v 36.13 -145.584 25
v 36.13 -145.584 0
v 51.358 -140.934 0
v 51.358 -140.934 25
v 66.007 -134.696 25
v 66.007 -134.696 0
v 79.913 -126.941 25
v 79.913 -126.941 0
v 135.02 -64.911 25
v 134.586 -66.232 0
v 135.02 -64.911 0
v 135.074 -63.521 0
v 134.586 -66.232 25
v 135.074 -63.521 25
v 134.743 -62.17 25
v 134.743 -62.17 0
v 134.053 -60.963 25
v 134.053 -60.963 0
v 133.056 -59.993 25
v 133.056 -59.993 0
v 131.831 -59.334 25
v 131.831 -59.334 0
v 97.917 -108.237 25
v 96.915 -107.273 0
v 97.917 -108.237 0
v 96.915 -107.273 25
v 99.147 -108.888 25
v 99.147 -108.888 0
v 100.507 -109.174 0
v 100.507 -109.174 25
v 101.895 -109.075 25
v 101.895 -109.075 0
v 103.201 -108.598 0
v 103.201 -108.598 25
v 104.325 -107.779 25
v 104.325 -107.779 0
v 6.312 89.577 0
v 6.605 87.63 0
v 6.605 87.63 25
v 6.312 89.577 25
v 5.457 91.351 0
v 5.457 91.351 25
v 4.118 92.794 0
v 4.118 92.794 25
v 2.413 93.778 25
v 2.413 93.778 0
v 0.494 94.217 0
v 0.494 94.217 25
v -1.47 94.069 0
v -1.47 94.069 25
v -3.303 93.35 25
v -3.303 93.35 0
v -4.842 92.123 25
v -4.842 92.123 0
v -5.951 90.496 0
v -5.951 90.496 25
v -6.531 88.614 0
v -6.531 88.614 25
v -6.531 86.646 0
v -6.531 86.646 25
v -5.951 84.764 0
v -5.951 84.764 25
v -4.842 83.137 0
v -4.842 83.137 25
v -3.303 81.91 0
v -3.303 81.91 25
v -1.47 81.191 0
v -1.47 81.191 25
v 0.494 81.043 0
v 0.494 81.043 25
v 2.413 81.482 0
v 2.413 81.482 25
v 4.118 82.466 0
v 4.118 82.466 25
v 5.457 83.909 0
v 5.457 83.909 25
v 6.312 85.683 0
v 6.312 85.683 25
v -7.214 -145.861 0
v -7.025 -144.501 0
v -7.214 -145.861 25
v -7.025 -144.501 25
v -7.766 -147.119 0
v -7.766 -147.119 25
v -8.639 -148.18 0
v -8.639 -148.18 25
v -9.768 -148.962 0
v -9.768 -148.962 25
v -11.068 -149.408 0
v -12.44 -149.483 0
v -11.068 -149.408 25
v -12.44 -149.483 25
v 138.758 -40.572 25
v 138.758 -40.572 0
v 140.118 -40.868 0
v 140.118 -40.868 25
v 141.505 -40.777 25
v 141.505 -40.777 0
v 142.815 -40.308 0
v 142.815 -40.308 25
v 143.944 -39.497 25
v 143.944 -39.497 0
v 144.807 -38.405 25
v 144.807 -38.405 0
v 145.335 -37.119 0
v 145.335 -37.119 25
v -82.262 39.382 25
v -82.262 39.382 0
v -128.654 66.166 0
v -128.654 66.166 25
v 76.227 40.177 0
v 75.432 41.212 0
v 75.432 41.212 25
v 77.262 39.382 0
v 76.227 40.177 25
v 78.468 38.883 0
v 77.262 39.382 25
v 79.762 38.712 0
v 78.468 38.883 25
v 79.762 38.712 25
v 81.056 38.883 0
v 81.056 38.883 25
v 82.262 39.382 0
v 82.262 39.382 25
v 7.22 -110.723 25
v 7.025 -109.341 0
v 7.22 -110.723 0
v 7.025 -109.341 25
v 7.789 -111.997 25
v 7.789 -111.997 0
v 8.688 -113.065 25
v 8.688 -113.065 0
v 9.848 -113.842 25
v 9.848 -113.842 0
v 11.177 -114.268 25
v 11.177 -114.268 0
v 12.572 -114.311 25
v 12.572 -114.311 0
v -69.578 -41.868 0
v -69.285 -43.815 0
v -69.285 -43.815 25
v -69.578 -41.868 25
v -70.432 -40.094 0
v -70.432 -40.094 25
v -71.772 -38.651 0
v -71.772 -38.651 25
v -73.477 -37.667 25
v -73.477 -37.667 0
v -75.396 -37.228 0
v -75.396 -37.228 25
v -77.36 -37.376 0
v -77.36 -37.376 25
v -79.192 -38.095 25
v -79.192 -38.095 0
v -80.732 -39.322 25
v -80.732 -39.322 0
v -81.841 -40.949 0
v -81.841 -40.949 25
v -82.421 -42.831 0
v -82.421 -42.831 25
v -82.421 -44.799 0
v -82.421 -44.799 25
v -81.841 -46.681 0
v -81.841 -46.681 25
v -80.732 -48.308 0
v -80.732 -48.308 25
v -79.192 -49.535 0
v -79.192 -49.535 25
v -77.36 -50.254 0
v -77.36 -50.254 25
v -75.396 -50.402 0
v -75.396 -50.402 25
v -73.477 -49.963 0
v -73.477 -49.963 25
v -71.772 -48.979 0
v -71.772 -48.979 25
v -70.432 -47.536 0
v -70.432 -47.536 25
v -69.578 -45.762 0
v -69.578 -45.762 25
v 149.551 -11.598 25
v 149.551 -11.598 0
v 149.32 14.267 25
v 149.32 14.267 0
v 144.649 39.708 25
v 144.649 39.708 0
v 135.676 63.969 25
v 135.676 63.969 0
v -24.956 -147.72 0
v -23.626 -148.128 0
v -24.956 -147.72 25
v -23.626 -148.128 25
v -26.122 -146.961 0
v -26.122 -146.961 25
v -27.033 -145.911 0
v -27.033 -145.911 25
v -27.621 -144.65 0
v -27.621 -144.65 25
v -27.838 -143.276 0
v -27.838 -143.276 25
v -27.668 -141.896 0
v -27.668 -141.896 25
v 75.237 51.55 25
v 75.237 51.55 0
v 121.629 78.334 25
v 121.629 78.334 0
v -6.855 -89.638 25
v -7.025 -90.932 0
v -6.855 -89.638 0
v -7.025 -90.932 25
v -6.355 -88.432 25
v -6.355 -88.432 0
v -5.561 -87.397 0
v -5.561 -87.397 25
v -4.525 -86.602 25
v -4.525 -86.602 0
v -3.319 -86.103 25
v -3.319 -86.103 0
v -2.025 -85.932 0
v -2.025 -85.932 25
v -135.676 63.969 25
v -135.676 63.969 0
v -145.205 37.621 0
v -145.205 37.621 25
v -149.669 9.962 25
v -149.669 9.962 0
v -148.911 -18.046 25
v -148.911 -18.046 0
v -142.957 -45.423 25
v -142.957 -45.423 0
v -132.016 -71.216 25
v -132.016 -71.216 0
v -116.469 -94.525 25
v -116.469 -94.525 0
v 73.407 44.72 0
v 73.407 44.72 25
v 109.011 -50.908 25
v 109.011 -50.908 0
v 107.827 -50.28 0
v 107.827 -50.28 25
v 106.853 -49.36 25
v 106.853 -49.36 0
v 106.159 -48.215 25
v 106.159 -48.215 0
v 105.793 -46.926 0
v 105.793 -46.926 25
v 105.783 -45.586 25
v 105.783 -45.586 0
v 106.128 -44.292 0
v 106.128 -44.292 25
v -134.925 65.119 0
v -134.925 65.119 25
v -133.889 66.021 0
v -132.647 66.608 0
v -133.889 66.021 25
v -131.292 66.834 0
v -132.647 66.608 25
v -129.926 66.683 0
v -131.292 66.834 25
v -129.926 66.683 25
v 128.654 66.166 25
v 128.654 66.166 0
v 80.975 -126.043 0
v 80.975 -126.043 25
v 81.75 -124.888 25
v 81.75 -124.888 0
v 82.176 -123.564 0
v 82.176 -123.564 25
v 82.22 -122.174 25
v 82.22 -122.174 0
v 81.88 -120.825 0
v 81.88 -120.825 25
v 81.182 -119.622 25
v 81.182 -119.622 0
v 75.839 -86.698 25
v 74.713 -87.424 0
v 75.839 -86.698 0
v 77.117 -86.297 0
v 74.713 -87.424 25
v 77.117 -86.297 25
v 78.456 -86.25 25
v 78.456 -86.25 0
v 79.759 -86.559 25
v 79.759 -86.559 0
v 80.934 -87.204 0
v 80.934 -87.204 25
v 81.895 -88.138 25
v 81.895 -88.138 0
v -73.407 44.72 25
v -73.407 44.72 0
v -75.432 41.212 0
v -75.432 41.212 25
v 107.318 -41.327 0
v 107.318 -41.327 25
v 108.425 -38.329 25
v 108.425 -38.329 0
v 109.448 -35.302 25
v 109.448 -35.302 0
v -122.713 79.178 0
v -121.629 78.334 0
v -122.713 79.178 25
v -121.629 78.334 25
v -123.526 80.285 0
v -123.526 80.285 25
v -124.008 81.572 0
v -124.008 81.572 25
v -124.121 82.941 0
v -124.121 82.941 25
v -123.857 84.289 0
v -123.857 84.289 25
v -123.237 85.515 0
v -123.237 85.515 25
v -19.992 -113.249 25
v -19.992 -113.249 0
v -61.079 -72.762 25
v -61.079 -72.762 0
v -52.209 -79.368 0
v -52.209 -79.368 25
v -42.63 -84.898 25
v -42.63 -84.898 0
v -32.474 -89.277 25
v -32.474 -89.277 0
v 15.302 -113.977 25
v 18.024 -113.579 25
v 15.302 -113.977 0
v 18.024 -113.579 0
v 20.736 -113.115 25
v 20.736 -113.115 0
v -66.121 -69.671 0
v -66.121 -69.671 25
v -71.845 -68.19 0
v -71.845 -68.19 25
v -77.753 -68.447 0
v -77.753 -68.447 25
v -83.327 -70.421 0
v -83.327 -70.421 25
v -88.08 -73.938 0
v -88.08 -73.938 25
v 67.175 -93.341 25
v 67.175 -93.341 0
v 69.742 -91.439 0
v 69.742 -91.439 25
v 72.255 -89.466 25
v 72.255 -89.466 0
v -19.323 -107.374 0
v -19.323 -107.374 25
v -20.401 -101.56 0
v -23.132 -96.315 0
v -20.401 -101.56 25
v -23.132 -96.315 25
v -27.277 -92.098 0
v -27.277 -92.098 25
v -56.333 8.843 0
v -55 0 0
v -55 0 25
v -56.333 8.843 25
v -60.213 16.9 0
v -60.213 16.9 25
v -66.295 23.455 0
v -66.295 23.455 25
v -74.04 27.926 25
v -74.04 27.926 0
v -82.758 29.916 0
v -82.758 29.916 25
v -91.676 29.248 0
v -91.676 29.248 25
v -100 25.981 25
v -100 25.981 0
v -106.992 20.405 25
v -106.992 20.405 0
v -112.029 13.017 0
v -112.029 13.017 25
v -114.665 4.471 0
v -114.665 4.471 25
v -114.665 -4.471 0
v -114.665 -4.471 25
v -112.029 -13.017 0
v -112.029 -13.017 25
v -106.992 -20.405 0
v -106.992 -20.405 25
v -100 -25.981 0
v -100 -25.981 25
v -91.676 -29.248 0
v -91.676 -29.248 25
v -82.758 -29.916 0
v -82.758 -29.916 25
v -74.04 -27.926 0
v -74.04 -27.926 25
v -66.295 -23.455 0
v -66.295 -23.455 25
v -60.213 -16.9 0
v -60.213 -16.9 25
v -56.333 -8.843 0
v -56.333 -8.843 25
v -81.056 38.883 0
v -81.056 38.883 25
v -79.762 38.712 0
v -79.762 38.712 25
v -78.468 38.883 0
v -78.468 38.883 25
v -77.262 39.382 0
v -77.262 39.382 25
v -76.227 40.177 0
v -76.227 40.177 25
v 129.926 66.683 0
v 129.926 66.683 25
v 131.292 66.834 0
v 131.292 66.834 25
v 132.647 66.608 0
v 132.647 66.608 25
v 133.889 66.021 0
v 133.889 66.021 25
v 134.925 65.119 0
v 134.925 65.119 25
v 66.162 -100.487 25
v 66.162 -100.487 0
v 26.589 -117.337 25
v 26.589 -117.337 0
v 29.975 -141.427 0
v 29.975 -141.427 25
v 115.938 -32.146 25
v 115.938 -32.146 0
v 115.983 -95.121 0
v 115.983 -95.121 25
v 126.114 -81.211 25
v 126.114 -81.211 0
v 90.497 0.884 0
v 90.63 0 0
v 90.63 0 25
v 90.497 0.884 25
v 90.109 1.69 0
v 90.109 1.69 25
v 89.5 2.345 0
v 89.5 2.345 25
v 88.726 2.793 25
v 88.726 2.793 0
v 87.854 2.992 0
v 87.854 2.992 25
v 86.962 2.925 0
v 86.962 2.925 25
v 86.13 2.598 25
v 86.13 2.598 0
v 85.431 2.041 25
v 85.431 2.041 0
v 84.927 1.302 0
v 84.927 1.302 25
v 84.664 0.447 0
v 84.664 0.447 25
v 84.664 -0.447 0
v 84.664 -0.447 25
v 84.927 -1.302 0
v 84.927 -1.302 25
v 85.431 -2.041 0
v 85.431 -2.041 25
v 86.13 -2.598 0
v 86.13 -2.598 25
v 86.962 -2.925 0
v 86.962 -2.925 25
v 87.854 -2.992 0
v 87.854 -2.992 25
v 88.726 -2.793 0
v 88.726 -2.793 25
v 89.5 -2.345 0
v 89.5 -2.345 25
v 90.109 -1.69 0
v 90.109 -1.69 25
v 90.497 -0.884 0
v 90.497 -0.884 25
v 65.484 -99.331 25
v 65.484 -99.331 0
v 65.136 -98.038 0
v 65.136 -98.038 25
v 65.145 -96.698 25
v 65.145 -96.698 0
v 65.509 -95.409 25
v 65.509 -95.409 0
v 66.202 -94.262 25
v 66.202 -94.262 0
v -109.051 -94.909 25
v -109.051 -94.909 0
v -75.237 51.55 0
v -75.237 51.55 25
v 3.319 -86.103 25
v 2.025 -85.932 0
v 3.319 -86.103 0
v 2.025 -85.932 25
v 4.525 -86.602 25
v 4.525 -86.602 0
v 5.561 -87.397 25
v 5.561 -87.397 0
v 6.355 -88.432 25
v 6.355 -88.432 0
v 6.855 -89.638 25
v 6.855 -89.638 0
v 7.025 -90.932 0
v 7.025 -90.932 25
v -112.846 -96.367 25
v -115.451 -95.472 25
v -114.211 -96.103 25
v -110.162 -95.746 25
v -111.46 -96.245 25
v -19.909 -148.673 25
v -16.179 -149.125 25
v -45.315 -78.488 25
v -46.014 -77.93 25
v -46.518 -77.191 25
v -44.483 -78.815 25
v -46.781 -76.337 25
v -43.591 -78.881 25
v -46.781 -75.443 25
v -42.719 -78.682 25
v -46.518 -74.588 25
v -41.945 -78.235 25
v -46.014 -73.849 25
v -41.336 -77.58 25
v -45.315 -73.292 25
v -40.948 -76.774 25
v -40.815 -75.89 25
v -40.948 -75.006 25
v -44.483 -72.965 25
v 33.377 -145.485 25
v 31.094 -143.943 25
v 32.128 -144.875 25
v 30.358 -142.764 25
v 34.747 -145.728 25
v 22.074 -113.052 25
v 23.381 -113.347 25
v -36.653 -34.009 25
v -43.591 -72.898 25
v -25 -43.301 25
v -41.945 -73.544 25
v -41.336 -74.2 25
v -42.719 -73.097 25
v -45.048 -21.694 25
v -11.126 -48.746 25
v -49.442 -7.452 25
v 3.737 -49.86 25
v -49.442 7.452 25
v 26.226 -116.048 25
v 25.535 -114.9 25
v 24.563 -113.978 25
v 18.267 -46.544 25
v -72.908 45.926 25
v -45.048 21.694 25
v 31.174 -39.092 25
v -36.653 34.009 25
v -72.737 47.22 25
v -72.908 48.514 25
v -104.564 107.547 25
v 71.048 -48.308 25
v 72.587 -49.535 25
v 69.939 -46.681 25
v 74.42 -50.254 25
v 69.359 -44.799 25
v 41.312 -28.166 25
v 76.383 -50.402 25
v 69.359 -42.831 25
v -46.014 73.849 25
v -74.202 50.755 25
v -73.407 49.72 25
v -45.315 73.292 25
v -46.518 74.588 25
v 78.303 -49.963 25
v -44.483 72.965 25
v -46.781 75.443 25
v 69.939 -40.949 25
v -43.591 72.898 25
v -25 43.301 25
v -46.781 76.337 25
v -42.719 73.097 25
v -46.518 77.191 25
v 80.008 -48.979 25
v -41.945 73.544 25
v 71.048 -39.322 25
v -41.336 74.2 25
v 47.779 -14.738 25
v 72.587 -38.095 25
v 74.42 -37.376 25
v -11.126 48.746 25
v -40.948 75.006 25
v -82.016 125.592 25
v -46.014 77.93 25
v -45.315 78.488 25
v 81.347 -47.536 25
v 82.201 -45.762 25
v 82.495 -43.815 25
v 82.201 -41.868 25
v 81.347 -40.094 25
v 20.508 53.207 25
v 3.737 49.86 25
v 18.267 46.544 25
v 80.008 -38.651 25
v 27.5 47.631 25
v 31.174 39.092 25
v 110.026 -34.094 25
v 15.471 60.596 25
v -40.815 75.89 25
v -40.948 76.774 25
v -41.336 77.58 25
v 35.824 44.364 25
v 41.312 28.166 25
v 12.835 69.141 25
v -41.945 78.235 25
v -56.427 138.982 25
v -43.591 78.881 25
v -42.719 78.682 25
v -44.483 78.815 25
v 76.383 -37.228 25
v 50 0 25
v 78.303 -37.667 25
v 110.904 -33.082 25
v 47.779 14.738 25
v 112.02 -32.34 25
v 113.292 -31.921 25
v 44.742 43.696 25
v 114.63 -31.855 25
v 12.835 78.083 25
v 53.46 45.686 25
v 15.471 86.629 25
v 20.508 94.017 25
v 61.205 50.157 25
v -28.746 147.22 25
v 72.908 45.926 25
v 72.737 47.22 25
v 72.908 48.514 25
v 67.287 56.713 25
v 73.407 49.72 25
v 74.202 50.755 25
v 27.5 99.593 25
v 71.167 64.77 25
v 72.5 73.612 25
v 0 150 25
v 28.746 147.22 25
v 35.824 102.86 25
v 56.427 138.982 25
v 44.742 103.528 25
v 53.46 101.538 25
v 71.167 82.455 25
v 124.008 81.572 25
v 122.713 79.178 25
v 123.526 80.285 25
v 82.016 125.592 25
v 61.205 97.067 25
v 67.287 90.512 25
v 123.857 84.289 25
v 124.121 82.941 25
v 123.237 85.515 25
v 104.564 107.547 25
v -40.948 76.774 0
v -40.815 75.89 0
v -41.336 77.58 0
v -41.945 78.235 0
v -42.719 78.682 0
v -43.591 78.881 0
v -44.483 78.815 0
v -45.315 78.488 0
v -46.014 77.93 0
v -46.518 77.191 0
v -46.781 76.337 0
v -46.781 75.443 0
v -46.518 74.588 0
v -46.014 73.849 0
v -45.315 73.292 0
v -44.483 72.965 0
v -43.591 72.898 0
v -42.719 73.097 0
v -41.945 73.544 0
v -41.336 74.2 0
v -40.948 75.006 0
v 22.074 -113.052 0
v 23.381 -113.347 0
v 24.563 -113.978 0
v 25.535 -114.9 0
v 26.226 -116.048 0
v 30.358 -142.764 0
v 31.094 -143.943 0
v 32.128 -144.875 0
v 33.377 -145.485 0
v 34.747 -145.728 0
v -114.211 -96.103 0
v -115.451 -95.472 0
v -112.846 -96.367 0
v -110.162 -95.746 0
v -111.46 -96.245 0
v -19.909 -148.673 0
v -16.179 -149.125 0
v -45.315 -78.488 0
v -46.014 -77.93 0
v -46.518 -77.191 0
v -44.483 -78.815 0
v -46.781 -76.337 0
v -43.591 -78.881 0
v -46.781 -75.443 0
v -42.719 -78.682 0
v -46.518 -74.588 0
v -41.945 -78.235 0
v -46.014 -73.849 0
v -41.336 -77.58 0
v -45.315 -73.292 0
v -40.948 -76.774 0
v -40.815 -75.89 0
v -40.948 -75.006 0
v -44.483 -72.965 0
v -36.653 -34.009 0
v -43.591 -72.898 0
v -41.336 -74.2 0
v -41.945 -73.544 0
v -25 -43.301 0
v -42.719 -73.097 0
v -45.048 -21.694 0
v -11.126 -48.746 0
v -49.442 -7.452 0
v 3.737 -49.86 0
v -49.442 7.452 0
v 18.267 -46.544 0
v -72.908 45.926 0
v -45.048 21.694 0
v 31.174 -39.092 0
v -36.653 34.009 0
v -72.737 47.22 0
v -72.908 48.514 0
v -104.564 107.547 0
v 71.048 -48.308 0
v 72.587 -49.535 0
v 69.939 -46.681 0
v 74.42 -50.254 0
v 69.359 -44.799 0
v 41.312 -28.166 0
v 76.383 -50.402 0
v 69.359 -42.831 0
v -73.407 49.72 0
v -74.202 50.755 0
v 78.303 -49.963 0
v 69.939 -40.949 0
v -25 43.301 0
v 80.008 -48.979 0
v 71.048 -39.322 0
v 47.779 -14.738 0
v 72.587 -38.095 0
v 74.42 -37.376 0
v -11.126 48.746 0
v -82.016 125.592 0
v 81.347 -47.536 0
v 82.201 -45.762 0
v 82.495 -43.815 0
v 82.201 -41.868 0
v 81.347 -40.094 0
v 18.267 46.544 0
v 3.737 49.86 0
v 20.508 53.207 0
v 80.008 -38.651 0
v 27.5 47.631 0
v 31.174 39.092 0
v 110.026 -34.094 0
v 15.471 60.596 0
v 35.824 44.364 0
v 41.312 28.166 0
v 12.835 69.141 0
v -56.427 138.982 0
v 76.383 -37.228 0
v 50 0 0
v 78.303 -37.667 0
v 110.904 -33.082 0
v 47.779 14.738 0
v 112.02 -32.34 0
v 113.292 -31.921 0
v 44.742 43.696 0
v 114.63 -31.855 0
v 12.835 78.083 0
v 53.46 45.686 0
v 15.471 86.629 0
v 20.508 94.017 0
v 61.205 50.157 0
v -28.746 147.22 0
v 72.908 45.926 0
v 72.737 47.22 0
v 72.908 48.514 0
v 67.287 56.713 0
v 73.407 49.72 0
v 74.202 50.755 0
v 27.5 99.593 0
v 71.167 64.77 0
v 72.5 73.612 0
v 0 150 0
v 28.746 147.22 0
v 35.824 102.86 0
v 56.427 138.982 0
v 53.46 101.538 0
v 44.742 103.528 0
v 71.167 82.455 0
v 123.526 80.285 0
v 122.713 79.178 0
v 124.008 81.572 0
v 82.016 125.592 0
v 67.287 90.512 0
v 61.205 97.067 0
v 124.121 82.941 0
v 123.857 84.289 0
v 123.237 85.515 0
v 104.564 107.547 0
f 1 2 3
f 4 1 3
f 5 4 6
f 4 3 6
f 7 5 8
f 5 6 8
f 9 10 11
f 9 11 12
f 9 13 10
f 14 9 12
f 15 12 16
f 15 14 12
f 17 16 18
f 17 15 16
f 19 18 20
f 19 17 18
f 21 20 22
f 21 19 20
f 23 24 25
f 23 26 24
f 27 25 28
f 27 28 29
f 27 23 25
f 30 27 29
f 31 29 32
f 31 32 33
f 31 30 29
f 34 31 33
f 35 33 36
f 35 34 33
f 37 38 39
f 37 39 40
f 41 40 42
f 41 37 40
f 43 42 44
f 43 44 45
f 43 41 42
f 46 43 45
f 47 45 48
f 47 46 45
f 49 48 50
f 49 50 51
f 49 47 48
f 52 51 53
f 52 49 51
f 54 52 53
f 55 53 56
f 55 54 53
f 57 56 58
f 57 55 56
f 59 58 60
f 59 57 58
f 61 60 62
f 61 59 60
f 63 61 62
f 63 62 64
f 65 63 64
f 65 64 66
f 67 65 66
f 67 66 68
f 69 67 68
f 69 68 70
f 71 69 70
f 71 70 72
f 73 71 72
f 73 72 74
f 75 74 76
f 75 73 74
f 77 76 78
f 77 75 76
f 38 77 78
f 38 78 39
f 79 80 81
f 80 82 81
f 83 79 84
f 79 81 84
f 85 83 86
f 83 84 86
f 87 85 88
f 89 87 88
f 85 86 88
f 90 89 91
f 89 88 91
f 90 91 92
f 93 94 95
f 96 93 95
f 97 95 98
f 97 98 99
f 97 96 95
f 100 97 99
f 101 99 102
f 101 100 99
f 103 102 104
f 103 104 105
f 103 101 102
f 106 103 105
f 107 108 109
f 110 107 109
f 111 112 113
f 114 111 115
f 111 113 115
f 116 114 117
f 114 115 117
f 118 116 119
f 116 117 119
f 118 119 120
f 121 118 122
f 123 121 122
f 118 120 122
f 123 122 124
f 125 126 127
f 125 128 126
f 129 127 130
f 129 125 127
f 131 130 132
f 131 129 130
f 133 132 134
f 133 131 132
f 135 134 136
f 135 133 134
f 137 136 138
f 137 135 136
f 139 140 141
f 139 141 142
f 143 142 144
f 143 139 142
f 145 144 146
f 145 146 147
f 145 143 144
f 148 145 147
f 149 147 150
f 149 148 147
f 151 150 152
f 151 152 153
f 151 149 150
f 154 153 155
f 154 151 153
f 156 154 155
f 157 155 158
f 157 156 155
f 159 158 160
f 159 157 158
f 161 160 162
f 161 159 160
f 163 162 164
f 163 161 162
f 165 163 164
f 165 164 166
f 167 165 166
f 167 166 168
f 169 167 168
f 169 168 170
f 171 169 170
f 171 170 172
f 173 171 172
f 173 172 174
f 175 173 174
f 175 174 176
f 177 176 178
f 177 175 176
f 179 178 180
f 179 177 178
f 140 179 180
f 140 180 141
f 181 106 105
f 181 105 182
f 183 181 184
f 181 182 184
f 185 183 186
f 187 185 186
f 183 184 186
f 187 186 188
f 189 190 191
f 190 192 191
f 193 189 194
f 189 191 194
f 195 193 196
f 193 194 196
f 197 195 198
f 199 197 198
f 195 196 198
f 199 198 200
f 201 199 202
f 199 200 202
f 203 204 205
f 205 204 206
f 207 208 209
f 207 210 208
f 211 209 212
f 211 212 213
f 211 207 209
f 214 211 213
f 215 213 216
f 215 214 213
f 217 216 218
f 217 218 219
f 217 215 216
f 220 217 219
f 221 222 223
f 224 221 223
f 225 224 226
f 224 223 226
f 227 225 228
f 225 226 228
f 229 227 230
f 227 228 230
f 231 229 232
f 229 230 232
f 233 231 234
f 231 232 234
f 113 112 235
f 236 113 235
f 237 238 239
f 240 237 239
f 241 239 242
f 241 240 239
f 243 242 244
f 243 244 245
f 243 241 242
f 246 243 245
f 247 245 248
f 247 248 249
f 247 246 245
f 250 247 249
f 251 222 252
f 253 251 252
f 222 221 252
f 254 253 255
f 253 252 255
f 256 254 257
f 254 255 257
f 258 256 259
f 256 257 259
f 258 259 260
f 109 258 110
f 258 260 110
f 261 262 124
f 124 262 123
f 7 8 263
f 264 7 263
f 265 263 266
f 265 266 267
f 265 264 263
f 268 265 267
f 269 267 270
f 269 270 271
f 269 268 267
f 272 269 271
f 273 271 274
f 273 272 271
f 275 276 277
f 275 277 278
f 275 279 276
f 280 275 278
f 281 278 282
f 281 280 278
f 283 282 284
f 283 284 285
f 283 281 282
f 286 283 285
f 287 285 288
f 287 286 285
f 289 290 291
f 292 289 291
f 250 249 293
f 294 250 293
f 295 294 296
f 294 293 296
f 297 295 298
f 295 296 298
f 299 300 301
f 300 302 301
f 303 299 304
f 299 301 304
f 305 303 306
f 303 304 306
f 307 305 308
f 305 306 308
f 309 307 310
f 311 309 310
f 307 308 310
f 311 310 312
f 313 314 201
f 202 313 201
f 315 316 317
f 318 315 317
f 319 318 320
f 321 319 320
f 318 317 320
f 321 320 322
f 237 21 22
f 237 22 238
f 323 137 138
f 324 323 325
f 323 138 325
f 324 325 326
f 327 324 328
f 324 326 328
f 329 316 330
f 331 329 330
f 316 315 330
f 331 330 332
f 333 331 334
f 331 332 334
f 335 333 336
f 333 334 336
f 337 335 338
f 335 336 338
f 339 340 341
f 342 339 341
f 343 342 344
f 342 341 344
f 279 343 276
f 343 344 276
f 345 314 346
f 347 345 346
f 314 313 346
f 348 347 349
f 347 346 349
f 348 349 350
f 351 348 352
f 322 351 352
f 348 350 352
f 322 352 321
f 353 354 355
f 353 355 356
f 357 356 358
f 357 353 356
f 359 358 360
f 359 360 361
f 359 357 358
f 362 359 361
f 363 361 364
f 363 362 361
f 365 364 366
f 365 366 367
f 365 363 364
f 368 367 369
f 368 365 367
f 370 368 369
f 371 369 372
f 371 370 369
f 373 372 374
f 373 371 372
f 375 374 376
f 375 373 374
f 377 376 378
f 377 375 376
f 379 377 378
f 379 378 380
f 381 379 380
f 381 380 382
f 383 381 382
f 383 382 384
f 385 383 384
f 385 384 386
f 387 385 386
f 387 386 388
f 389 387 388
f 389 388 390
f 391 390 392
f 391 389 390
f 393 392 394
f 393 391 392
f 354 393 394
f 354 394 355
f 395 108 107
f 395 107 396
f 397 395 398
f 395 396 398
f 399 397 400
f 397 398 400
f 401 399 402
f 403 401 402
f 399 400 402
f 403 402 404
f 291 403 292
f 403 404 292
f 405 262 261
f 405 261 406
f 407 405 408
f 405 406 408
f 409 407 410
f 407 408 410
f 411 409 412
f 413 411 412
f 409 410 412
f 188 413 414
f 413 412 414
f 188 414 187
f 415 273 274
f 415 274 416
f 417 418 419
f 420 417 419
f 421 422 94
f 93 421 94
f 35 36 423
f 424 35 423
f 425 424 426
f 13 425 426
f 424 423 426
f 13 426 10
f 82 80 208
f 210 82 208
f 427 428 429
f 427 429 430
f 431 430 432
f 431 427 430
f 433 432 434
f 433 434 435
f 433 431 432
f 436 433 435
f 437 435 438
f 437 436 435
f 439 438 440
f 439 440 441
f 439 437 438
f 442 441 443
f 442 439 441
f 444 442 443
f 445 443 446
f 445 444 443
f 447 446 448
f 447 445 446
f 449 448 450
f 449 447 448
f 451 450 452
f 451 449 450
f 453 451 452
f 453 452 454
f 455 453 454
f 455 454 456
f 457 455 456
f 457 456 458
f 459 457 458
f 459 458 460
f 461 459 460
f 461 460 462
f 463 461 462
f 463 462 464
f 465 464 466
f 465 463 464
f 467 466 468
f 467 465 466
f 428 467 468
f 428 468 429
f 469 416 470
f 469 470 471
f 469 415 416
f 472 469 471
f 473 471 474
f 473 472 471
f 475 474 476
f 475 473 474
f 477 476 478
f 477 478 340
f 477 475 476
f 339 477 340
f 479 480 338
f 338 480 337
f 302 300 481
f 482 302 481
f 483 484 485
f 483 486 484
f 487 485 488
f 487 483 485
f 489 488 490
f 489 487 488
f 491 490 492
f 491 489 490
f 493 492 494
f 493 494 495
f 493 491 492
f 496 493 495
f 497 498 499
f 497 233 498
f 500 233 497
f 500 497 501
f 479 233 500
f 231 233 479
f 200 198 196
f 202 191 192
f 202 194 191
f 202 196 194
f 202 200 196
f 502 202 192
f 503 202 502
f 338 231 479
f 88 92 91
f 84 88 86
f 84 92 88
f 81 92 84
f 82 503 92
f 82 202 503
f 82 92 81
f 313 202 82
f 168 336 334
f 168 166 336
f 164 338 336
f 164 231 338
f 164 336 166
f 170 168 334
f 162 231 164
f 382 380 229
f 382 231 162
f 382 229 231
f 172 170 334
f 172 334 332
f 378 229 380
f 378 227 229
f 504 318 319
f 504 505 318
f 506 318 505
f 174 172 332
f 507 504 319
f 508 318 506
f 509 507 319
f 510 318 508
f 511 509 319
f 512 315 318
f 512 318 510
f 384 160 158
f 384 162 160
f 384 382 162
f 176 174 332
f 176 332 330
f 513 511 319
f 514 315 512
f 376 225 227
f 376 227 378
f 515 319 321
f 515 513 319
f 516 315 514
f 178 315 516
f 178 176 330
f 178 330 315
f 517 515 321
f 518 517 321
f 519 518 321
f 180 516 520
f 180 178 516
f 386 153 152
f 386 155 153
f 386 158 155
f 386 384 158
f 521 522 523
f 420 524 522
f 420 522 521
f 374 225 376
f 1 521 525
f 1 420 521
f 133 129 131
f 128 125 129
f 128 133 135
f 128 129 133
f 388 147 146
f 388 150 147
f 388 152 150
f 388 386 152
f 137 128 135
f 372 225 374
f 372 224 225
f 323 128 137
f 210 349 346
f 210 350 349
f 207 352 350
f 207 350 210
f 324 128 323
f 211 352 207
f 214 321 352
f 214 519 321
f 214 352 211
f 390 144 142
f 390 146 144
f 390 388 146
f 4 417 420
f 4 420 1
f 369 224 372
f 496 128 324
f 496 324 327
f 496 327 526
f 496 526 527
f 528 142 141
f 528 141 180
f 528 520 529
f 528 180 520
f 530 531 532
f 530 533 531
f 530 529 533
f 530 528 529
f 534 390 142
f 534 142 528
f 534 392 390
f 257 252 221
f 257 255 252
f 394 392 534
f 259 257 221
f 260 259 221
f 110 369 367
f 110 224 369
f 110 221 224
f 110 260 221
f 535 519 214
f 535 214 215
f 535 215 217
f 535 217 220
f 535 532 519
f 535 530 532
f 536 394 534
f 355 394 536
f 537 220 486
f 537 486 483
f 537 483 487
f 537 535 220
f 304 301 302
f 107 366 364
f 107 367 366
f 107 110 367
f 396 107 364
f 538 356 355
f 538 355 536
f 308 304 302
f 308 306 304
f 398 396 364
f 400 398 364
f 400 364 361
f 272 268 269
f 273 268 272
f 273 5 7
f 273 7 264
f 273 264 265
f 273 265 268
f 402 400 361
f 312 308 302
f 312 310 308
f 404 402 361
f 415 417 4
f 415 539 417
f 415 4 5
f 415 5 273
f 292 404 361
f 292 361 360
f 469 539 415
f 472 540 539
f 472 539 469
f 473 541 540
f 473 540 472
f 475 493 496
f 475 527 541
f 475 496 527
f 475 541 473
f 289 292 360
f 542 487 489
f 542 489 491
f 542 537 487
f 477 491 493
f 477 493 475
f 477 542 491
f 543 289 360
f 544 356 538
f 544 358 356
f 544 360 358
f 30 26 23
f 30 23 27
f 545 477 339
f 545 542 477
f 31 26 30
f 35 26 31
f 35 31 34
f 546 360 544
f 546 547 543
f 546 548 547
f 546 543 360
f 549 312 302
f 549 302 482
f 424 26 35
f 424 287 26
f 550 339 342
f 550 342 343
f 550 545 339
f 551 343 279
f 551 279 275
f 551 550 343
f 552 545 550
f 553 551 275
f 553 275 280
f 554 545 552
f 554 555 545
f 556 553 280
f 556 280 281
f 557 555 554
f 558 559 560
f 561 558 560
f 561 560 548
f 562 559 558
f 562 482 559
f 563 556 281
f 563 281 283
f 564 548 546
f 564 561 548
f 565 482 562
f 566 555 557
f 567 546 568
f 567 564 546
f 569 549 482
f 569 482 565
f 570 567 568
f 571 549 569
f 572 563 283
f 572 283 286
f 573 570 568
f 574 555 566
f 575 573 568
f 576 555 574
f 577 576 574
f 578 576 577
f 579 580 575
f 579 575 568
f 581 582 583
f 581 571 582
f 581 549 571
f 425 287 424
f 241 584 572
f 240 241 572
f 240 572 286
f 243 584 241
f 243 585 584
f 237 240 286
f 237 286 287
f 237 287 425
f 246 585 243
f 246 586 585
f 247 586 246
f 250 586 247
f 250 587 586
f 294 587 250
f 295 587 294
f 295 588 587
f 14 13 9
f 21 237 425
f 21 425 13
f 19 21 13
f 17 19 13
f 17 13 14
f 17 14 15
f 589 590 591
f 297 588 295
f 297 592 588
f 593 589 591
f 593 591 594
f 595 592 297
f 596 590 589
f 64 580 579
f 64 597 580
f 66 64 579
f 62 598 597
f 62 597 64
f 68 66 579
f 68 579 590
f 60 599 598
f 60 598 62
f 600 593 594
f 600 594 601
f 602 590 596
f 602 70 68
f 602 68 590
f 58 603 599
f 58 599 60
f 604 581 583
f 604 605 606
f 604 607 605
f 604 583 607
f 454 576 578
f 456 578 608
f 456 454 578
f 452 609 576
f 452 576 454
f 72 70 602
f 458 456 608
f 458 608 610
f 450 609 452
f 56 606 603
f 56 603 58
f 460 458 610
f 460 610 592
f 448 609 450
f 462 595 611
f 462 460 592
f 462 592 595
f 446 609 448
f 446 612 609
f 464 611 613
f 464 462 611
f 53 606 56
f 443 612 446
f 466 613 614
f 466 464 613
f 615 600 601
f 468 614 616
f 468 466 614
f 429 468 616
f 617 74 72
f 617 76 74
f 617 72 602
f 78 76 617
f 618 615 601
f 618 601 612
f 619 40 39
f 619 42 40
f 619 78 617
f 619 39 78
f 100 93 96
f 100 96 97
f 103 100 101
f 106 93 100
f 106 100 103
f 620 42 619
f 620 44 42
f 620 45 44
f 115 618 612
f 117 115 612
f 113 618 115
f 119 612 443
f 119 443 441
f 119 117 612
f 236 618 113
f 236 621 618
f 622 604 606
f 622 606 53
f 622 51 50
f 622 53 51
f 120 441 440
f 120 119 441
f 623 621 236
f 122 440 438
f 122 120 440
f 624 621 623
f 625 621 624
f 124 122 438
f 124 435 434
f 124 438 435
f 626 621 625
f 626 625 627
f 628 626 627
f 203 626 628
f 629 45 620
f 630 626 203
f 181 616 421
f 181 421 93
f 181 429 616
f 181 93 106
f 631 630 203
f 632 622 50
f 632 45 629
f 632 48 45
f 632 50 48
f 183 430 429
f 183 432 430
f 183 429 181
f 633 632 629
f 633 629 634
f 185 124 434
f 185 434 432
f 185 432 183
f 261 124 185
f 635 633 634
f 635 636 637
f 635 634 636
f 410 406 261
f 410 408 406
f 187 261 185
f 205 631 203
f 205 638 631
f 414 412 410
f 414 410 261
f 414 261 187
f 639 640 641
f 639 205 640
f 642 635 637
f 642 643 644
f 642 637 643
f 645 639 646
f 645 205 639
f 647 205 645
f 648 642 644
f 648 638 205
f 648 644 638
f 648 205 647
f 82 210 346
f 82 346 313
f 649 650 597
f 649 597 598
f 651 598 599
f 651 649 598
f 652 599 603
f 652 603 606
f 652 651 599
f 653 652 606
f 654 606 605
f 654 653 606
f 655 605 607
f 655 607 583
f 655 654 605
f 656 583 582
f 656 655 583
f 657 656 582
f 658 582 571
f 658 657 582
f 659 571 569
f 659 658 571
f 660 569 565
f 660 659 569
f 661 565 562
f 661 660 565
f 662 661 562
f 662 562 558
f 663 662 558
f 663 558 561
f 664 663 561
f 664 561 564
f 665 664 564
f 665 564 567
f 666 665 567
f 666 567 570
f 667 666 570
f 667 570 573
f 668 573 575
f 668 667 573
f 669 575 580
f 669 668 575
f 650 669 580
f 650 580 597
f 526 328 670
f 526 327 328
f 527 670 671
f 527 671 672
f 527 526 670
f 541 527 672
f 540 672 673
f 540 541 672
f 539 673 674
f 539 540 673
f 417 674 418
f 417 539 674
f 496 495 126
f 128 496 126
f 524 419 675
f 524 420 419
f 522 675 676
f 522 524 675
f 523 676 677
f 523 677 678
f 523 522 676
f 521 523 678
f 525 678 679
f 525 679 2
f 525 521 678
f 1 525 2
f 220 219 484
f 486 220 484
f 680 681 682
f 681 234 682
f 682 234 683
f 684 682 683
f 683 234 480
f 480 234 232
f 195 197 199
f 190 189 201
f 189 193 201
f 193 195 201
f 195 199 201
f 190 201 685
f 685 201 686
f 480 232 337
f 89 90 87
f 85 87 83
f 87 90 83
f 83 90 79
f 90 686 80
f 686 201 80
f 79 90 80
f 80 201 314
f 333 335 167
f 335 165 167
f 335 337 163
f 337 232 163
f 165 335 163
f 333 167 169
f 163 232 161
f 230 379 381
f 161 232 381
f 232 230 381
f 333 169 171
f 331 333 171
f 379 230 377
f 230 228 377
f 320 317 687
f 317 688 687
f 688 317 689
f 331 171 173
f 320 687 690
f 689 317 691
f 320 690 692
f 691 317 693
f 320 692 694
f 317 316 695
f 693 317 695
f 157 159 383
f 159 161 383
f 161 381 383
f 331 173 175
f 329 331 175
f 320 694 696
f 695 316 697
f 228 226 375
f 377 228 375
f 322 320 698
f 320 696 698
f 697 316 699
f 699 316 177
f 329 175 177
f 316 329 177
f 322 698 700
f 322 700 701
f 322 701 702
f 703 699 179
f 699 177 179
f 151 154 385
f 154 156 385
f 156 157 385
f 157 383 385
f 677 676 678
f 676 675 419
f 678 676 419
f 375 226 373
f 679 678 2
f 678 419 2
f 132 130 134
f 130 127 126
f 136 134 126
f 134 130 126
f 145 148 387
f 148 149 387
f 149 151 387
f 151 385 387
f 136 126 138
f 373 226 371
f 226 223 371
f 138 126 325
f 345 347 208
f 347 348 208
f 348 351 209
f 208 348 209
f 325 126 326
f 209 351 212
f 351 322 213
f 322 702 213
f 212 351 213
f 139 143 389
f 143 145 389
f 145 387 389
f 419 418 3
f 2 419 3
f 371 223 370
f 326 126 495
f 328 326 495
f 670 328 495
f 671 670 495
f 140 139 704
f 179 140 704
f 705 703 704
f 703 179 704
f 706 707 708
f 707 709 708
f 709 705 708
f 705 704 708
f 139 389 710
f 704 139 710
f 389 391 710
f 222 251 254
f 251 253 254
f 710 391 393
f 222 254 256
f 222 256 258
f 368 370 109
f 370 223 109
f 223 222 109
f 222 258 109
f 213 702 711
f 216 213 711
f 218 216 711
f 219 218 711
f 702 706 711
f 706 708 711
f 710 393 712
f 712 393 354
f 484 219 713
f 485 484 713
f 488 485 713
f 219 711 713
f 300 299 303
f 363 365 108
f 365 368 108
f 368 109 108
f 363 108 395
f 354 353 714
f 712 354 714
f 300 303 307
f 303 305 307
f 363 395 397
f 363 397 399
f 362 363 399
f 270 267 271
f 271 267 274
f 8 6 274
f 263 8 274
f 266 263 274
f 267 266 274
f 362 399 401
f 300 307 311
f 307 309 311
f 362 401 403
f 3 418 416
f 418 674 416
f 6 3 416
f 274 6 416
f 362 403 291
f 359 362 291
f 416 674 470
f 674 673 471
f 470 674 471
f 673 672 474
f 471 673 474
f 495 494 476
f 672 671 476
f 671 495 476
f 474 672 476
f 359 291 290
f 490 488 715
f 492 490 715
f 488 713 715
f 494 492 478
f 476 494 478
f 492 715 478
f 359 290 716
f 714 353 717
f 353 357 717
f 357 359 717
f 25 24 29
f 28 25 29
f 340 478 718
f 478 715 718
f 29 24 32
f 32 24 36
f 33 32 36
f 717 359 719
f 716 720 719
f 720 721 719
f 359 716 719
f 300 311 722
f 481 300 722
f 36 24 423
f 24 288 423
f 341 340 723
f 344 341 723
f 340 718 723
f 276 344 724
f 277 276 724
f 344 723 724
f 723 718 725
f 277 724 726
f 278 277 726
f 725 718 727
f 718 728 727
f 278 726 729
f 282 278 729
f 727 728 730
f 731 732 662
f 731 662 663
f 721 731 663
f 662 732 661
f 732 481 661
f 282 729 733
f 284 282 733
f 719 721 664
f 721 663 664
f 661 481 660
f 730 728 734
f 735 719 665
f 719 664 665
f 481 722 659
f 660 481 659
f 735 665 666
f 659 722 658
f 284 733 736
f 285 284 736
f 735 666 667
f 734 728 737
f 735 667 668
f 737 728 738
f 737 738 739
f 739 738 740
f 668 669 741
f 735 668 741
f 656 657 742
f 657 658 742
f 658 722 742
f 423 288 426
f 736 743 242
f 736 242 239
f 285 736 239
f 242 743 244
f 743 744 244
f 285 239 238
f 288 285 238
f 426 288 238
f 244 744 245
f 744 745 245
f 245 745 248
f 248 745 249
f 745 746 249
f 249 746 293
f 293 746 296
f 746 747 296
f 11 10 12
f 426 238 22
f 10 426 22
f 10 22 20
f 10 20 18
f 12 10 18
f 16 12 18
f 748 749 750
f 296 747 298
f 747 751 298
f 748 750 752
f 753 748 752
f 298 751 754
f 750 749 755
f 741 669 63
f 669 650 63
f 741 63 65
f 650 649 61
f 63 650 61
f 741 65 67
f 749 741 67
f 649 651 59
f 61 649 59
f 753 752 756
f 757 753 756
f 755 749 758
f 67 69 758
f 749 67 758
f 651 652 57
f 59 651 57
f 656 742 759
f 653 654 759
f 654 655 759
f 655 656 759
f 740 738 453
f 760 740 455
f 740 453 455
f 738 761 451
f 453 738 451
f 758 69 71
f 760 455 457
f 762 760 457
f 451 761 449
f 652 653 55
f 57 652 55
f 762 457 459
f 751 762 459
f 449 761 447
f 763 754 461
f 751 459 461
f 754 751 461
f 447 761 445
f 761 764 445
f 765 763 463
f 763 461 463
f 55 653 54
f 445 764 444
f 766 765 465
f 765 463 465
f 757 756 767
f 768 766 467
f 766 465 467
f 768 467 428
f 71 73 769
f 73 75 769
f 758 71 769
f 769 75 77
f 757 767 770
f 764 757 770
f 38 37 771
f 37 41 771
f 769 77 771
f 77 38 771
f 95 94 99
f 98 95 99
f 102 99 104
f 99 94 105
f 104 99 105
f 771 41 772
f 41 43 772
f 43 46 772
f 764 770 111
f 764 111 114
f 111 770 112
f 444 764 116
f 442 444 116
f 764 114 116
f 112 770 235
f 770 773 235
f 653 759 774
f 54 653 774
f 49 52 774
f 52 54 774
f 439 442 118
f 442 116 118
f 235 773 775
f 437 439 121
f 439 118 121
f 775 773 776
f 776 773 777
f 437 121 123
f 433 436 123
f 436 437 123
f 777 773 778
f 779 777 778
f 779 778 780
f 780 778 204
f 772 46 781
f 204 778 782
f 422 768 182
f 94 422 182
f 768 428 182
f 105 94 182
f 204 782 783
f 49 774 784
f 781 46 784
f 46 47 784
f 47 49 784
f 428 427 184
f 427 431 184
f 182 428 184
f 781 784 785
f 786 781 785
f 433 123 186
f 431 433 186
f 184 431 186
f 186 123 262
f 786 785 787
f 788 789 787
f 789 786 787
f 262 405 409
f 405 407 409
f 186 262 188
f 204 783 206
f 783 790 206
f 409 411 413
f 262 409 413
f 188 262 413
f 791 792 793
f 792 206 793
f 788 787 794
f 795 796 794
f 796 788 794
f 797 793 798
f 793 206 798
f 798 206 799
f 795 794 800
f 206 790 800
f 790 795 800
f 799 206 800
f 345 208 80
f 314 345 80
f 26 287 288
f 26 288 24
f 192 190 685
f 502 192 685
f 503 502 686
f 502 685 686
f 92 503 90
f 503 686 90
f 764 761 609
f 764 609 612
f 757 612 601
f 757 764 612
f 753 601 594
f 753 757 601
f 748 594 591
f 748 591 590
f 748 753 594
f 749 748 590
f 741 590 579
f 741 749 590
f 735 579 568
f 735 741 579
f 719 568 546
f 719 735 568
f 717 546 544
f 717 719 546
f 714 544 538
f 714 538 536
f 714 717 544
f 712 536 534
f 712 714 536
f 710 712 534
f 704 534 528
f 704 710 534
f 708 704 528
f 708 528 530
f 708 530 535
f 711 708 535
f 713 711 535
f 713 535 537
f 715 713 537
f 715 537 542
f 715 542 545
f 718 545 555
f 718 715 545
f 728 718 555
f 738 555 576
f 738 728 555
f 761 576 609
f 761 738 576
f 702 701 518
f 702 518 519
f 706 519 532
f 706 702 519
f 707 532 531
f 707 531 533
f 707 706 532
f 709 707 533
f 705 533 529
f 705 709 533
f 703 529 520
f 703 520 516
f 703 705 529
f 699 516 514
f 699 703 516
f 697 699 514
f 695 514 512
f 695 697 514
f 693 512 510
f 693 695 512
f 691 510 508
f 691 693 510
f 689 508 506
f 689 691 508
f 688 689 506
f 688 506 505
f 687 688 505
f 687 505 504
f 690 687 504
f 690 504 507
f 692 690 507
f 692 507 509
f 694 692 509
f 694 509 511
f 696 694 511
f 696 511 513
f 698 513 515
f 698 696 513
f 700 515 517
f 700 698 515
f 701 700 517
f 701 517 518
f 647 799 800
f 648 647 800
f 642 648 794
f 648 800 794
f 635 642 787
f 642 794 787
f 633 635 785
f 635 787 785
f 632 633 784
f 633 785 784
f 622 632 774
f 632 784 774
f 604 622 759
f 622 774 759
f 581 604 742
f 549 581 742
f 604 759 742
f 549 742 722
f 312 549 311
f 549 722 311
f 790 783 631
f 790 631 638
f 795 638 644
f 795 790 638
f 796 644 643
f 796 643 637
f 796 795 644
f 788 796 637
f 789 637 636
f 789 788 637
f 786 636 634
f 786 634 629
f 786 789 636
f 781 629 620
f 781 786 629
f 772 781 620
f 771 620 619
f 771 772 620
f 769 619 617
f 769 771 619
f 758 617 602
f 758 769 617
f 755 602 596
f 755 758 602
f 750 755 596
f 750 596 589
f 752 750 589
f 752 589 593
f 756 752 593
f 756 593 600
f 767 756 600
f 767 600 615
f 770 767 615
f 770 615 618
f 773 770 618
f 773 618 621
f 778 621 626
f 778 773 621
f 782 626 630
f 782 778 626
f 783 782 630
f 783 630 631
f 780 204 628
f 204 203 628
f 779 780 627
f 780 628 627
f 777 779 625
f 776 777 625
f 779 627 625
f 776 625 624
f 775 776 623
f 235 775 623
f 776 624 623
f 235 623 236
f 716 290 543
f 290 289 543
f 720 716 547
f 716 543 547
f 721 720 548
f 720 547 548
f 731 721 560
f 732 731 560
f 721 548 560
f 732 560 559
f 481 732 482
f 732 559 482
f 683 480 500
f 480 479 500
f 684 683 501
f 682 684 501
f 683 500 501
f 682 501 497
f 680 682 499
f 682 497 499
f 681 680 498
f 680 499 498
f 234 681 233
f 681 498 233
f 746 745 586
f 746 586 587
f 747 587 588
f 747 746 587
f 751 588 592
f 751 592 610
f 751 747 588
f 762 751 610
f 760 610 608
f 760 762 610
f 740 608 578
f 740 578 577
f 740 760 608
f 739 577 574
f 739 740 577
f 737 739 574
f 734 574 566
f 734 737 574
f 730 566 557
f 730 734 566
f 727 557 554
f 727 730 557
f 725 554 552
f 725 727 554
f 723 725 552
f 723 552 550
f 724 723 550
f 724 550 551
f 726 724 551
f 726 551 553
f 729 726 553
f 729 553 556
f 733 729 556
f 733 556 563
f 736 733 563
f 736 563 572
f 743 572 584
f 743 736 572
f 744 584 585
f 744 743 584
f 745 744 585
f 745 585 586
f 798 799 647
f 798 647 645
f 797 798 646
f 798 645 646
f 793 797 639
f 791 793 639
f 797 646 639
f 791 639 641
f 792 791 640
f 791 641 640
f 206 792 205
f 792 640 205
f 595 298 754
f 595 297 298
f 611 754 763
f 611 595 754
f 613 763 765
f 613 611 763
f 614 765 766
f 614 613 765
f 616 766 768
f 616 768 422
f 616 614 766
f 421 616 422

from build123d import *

# Parameters (mm, degrees)
F0_R     = 3
F0_R_2   = 6.605
F0_R_3   = 30
F0_R_4   = 50
F1_DEPTH = 25
F2_R     = 5
F3_R     = 20


with BuildPart() as f1:
    # F0 (on Top) → F1 (new body)
    with BuildSketch(Plane.XY):
        with BuildLine():
            Line((-7.025, -149.835408), (-7.025, -85.932344))
            Line((-7.025, -85.932344), (7.025, -85.932344))
            Line((7.025, -85.932344), (7.025, -114.785232))
            ThreePointArc((7.025, -114.785232), (16.492462, -113.811242), (25.846962, -112.057729))
            Line((25.846962, -112.057729), (30.732203, -146.818022))
            ThreePointArc((30.732203, -146.818022), (58.765568, -138.009449), (84.543744, -123.904622))
            Line((84.543744, -123.904622), (62.870433, -96.292828))
            ThreePointArc((62.870433, -96.292828), (71.005576, -90.461087), (78.602796, -83.944032))
            Line((78.602796, -83.944032), (100.276107, -111.555826))
            ThreePointArc((100.276107, -111.555826), (121.248185, -88.311254), (136.938486, -61.219694))
            Line((136.938486, -61.219694), (104.009355, -49.061736))
            ThreePointArc((104.009355, -49.061736), (107.881617, -39.831604), (110.936591, -30.299716))
            Line((110.936591, -30.299716), (143.865722, -42.457674))
            ThreePointArc((143.865722, -42.457674), (149.325238, 14.211734), (133.273769, 68.833875))
            Line((133.273769, 68.833875), (77.932093, 36.882344))
            Line((77.932093, 36.882344), (70.907093, 49.050001))
            Line((70.907093, 49.050001), (126.248769, 81.001532))
            ThreePointArc((126.248769, 81.001532), (0, 150), (-126.248769, 81.001532))
            Line((-126.248769, 81.001532), (-70.907093, 49.050001))
            Line((-70.907093, 49.050001), (-77.932093, 36.882344))
            Line((-77.932093, 36.882344), (-133.273769, 68.833875))
            ThreePointArc((-133.273769, 68.833875), (-148.903864, -18.100808), (-112.90112, -98.758985))
            Line((-112.90112, -98.758985), (-73.873014, -59.730878))
            ThreePointArc((-73.873014, -59.730878), (-47.5, -82.272413), (-14.791951, -93.841346))
            Line((-14.791951, -93.841346), (-29.077229, -147.154731))
            ThreePointArc((-29.077229, -147.154731), (-18.100808, -148.903864), (-7.025, -149.835408))
        make_face()
        with Locations((-43.815, -75.889806)):
            Circle(F0_R, mode=Mode.SUBTRACT)
        with Locations((-75.889806, -43.815)):
            Circle(F0_R_2, mode=Mode.SUBTRACT)
        with Locations((-85, 0)):
            Circle(F0_R_3, mode=Mode.SUBTRACT)
        Circle(F0_R_4, mode=Mode.SUBTRACT)
        with Locations((75.889806, -43.815)):
            Circle(F0_R_2, mode=Mode.SUBTRACT)
        with Locations((87.63, 0)):
            Circle(F0_R, mode=Mode.SUBTRACT)
        with Locations((-43.815, 75.889806)):
            Circle(F0_R, mode=Mode.SUBTRACT)
        with Locations((42.5, 73.612159)):
            Circle(F0_R_3, mode=Mode.SUBTRACT)
        with Locations((0, 87.63)):
            Circle(F0_R_2, mode=Mode.SUBTRACT)
    extrude(amount=F1_DEPTH)

    # F2
    f2_edges = [f1.edges().sort_by_distance(p)[0] for p in [
        (-77.932093, 36.882344, 12.5),
        (-70.907093, 49.050001, 12.5),
        (70.907093, 49.050001, 12.5),
        (77.932093, 36.882344, 12.5),
        (110.936591, -30.299716, 12.5),
        (104.009355, -49.061736, 12.5),
        (78.602796, -83.944032, 12.5),
        (62.870433, -96.292828, 12.5),
        (25.846962, -112.057729, 12.5),
        (7.025, -114.785232, 12.5),
        (7.025, -85.932344, 12.5),
        (-7.025, -85.932344, 12.5),
        (-7.025, -149.835408, 12.5),
        (-29.077229, -147.154731, 12.5),
        (-112.90112, -98.758985, 12.5),
        (30.732203, -146.818022, 12.5),
        (84.543744, -123.904622, 12.5),
        (100.276107, -111.555826, 12.5),
        (136.938486, -61.219694, 12.5),
        (143.865722, -42.457674, 12.5),
        (133.273769, 68.833875, 12.5),
        (126.248769, 81.001532, 12.5),
        (-126.248769, 81.001532, 12.5),
        (-133.273769, 68.833875, 12.5),
    ]]
    fillet(f2_edges, radius=F2_R)

    # F3
    f3_edges = [f1.edges().sort_by_distance(p)[0] for p in [
        (-73.873014, -59.730878, 12.5),
        (-14.791951, -93.841346, 12.5),
    ]]
    fillet(f3_edges, radius=F3_R)


solid = f1.part
